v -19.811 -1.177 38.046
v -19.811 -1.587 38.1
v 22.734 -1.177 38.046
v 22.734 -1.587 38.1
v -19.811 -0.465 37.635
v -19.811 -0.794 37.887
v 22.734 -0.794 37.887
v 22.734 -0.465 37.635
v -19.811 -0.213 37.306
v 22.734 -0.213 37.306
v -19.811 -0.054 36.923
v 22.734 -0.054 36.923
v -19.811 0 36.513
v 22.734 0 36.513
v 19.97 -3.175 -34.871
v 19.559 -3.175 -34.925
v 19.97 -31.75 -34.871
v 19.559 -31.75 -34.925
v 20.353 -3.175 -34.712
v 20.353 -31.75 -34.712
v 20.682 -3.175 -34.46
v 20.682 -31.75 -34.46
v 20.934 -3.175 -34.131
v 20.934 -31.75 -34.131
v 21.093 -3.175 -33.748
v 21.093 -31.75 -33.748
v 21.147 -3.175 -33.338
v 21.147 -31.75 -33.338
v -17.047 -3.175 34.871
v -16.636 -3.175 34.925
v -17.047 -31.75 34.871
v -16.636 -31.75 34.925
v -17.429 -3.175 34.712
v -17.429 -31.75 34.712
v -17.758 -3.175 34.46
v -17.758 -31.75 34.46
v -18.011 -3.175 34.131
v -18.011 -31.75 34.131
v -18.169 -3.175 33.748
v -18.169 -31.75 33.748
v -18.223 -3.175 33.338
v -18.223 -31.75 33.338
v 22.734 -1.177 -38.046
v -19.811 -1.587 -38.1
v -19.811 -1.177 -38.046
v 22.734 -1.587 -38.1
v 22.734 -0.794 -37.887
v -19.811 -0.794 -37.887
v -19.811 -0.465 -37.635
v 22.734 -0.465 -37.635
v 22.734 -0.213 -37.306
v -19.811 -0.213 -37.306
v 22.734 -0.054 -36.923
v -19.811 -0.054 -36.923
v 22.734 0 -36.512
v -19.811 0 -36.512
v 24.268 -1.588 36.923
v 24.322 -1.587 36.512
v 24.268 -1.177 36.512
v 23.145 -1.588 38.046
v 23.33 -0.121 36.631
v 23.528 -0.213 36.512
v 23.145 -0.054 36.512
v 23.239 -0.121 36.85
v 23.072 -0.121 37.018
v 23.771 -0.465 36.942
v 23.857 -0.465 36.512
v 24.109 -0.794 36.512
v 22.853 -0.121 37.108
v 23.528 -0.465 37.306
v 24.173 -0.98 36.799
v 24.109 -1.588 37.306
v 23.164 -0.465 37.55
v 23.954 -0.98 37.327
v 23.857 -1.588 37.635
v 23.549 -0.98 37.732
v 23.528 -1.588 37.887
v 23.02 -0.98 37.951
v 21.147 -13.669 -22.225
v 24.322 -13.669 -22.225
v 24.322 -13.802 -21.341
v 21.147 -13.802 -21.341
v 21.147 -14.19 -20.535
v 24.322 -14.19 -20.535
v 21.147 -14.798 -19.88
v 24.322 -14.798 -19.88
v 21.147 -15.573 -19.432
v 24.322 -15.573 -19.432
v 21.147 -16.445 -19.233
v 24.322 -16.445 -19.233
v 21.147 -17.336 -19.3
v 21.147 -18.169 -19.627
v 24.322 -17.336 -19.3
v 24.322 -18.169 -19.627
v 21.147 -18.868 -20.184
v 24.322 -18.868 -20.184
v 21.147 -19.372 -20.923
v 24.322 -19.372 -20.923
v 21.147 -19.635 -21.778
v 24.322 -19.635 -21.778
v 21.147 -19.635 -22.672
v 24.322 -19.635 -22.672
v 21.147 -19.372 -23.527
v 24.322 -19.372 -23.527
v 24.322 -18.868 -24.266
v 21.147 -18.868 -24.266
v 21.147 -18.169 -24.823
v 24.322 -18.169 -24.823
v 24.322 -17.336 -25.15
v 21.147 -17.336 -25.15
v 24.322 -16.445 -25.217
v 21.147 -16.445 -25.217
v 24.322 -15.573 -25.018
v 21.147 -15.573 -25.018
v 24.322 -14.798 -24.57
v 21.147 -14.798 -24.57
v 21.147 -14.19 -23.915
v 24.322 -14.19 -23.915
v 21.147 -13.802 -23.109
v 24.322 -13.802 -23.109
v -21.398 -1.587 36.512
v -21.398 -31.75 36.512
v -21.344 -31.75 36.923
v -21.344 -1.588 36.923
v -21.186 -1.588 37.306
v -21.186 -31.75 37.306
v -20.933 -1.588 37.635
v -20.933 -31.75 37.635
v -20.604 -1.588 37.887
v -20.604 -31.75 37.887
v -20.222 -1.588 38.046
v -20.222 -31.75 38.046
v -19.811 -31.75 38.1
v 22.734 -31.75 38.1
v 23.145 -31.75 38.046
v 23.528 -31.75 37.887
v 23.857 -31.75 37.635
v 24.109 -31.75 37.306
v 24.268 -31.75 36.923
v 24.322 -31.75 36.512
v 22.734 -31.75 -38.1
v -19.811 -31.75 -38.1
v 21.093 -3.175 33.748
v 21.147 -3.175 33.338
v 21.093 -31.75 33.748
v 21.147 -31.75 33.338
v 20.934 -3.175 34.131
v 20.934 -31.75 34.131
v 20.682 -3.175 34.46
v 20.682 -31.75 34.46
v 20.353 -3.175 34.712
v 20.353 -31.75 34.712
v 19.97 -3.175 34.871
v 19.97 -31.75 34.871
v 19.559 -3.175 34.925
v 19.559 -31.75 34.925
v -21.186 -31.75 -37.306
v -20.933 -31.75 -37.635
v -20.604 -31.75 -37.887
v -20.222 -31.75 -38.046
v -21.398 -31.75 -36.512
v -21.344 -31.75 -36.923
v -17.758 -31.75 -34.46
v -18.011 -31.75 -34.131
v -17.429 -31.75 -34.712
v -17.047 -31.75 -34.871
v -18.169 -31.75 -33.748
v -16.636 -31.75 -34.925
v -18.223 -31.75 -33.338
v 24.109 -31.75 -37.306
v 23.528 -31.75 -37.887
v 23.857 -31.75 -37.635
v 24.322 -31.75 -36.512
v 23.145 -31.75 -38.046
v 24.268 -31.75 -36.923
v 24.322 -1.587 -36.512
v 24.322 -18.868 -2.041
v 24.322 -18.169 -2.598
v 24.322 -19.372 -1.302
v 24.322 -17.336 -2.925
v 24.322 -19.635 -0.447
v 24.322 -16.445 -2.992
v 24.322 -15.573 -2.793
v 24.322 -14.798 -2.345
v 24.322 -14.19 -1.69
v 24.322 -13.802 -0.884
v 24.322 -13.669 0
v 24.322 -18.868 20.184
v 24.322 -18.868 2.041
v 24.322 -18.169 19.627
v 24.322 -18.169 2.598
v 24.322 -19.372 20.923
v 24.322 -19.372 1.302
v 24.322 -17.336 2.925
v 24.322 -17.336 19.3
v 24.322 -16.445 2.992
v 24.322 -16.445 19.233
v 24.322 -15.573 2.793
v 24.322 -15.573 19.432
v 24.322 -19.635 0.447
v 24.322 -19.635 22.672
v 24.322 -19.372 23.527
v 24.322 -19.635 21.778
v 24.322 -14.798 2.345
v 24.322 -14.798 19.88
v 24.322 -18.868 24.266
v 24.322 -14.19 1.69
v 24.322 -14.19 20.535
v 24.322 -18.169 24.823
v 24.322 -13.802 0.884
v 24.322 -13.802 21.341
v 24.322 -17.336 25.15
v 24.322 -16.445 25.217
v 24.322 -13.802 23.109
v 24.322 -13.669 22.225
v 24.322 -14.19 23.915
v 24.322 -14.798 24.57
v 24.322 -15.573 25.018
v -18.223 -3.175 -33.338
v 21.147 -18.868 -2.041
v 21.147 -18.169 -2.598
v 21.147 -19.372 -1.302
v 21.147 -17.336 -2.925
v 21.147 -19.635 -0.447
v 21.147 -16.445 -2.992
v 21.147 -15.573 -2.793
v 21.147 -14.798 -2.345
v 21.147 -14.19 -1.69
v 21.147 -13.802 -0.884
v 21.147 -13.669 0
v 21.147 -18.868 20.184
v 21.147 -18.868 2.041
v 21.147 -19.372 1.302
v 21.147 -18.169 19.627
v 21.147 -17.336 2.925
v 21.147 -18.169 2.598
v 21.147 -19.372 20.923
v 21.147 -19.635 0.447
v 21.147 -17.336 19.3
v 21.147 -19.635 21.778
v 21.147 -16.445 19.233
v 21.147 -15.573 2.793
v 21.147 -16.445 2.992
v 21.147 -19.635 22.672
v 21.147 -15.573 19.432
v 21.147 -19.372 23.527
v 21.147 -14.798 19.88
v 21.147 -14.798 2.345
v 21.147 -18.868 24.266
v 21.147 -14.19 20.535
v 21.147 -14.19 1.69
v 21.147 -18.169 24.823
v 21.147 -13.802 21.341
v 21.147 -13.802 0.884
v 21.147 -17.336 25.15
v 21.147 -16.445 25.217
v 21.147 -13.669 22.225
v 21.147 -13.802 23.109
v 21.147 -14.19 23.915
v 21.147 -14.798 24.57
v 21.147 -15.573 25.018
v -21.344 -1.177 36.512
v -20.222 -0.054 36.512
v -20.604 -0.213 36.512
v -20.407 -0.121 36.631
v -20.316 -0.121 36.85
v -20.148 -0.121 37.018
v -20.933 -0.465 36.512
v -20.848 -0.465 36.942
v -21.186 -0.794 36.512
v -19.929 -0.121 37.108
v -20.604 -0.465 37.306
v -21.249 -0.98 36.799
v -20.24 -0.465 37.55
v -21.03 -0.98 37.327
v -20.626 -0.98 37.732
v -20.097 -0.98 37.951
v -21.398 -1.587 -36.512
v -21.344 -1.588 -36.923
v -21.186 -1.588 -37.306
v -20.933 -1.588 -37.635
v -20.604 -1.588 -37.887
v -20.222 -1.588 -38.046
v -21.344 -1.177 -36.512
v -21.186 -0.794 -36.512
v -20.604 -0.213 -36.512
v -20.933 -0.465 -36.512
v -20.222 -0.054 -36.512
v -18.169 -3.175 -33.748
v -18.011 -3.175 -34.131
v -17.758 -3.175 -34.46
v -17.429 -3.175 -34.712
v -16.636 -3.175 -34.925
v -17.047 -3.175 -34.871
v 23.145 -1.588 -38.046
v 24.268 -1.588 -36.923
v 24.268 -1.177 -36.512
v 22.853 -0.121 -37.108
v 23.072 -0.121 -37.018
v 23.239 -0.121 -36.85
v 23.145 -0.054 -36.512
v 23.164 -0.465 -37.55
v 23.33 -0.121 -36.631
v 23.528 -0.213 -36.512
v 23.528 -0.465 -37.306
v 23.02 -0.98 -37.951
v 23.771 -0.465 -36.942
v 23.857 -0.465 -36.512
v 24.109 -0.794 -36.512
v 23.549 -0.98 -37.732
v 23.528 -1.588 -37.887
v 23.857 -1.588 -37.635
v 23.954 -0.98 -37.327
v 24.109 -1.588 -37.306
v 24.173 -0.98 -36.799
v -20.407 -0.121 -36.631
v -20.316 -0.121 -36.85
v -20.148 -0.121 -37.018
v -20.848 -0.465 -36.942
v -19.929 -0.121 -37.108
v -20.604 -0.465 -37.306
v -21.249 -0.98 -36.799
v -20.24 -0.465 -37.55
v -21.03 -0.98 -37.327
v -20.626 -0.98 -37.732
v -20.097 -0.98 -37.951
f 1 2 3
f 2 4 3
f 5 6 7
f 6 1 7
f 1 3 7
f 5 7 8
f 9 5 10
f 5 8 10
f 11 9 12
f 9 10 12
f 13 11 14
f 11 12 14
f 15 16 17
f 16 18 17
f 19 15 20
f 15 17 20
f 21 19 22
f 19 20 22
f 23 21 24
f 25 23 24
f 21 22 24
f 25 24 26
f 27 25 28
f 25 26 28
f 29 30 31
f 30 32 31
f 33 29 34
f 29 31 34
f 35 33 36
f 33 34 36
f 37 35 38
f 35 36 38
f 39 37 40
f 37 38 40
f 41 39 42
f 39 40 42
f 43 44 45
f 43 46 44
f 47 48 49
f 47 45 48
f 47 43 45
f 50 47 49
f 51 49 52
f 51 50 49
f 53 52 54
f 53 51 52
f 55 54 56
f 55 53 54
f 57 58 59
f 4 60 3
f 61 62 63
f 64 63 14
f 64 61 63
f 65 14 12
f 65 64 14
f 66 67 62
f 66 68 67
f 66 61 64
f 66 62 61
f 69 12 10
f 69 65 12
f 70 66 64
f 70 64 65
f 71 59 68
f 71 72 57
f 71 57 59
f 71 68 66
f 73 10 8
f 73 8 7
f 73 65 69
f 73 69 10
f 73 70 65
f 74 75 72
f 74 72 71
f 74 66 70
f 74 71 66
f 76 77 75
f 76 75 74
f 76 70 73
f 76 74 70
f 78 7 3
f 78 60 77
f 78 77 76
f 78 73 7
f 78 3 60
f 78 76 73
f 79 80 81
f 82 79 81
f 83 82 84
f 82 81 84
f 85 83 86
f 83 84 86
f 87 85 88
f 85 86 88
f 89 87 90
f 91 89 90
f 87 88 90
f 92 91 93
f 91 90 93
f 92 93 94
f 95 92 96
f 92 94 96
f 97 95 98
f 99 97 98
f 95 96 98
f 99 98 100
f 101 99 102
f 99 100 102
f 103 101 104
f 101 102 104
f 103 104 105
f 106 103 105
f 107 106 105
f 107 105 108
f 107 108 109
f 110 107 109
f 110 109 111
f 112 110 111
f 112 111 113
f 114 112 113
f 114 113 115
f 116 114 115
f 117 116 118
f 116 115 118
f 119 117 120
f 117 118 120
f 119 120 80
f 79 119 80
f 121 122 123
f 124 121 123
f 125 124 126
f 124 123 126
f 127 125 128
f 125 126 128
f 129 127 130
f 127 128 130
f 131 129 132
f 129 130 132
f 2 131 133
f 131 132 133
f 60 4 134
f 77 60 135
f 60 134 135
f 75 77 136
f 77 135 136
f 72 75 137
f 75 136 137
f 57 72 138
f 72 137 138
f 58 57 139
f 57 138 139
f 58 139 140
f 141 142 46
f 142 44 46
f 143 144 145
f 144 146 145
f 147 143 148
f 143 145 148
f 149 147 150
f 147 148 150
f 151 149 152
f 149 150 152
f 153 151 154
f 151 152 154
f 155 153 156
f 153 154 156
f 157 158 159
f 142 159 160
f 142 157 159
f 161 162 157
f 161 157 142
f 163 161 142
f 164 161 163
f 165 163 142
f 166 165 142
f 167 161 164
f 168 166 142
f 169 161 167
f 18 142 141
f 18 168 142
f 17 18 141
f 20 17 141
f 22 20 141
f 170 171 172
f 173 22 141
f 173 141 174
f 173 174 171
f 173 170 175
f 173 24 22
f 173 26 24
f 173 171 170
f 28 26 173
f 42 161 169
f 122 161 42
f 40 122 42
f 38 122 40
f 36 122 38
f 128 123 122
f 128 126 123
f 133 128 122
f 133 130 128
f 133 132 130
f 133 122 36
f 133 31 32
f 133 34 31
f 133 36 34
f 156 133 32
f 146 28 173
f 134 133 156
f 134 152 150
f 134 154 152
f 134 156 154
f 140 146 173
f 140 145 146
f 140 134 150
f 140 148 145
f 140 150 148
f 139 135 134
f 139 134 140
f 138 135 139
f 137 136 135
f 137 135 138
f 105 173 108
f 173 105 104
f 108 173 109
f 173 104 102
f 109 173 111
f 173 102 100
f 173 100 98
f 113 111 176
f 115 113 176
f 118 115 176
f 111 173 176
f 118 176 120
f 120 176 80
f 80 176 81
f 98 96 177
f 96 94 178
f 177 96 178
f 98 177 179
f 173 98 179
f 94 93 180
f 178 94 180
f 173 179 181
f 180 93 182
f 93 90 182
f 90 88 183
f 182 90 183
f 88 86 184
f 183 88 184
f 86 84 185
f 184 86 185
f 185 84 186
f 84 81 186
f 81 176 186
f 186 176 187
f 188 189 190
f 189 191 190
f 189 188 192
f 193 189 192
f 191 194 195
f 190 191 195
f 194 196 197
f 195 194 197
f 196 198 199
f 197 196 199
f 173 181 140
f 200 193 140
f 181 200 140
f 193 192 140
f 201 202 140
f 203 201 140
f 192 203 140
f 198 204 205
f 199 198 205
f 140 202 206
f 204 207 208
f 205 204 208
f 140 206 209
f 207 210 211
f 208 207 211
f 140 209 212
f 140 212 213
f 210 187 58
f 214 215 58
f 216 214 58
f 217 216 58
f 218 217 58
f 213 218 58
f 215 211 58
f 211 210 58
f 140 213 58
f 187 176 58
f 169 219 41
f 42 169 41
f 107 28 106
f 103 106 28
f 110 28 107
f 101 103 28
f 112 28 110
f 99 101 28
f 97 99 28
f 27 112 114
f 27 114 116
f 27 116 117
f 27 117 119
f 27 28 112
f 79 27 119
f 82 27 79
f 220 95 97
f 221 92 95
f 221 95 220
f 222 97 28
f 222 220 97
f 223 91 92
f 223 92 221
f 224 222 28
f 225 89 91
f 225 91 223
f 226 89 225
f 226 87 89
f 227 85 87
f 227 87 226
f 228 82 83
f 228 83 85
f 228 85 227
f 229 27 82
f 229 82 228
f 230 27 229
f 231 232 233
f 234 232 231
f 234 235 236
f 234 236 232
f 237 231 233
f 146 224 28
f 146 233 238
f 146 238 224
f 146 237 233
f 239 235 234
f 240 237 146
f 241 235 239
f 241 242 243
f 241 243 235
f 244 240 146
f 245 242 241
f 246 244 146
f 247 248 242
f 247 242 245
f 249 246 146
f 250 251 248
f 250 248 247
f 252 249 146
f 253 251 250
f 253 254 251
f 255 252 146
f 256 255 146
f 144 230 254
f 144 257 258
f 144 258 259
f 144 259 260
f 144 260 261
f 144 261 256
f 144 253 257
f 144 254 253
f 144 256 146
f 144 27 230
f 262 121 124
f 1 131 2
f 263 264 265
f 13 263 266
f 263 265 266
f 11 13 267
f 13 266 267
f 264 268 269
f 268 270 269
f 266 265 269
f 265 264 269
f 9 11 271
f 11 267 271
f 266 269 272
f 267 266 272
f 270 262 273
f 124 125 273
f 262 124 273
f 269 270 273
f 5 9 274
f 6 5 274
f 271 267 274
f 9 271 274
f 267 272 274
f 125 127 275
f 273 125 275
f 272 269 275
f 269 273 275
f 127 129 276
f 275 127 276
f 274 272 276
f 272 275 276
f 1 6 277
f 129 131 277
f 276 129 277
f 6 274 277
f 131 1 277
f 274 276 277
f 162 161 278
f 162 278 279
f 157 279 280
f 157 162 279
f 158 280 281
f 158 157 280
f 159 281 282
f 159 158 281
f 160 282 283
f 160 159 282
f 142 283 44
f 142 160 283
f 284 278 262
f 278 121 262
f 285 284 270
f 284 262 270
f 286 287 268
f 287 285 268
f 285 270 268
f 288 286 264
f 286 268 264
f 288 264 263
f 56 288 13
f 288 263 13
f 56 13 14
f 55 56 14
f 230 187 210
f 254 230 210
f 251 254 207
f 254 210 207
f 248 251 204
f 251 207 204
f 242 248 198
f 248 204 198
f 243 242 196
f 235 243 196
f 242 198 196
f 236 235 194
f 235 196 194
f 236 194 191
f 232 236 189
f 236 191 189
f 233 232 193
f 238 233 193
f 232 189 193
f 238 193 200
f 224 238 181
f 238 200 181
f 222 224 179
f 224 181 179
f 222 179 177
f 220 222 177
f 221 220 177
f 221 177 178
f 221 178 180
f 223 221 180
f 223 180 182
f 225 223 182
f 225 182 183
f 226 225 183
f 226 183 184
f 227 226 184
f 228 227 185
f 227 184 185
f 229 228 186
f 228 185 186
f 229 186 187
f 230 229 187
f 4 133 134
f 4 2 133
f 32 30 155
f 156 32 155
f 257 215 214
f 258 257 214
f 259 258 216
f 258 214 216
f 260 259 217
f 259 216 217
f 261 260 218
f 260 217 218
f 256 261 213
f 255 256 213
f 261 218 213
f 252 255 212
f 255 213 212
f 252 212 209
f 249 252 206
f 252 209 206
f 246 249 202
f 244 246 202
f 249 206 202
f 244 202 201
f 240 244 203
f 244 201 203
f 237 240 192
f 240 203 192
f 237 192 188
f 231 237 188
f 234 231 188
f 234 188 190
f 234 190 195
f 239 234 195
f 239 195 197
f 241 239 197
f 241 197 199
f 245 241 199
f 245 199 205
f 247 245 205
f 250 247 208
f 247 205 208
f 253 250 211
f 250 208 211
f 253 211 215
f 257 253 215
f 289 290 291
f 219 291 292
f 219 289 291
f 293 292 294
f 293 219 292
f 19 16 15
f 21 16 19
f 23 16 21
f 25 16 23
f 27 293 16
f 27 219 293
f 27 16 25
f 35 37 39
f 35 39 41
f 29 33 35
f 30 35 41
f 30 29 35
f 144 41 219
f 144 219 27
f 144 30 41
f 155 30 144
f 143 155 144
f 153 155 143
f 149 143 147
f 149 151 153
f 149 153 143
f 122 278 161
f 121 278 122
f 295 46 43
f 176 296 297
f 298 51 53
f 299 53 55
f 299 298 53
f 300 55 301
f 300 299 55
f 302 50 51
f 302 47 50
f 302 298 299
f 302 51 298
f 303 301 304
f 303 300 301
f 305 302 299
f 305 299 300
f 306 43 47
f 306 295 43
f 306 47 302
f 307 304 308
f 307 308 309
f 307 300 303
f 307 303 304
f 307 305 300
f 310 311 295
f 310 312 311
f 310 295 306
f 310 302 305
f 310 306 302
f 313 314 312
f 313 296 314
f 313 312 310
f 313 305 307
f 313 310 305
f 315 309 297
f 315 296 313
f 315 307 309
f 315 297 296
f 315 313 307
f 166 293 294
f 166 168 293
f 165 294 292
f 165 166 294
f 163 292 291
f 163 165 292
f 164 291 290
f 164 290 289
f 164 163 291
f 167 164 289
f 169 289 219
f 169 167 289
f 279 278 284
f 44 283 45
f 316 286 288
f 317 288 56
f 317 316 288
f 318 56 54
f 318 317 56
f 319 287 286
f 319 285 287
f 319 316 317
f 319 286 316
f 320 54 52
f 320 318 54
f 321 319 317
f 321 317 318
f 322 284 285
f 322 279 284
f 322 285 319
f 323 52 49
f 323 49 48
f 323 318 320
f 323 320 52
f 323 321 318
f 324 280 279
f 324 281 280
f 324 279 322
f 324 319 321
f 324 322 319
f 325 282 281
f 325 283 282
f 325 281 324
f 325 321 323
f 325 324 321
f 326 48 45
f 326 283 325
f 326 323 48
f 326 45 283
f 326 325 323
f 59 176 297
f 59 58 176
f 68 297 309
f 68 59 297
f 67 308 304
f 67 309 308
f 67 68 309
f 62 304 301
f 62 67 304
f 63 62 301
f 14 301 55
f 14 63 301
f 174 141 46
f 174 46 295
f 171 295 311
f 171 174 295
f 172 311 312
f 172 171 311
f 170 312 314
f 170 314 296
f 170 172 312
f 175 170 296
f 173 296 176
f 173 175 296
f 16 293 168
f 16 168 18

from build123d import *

# Parameters (mm, degrees)
F0_W     = 45.72
F0_H     = 76.2
F0_W_2   = 39.37
F0_H_2   = 69.85
F1_DEPTH = 31.75
F2_R     = 1.5875
F4_DEPTH = 3.175
F5_R     = 1.5875
F3_R     = 3
F6_DEPTH = 3.175


with BuildPart() as f1:
    # F0 (on Front) → F1 (new body)
    with BuildSketch(Plane.XZ):
        with Locations((1.461808, 0)):
            Rectangle(F0_W, F0_H)
        with Locations((1.461808, 0)):
            Rectangle(F0_W_2, F0_H_2, mode=Mode.SUBTRACT)
    extrude(amount=F1_DEPTH)

    # F2
    f2_edges = [f1.edges().sort_by_distance(p)[0] for p in [
        (24.321808, -15.875, -38.1),
        (24.321808, -15.875, 38.1),
        (-21.398192, -15.875, 38.1),
        (-21.398192, -15.875, -38.1),
        (-21.398192, 0, 0),
        (1.461808, 0, -38.1),
        (24.321808, 0, 0),
        (1.461808, 0, 38.1),
    ]]
    fillet(f2_edges, radius=F2_R)

    # F0 (on Front) → F4 (join)
    with BuildSketch(Plane.XZ):
        with Locations((1.461808, 0)):
            Rectangle(F0_W_2, F0_H_2)
    extrude(amount=F4_DEPTH)

    # F5
    f5_edges = [f1.edges().sort_by_distance(p)[0] for p in [
        (-18.223192, -17.4625, -34.925),
        (-18.223192, -17.4625, 34.925),
        (21.146808, -17.4625, -34.925),
        (21.146808, -17.4625, 34.925),
    ]]
    fillet(f5_edges, radius=F5_R)

    # F3 (on face) → F6 (cut, through all)
    with BuildSketch(Plane.YZ.offset(24.321808)):
        with Locations((-16.66875, -22.225)):
            Circle(F3_R)
        with Locations((-16.66875, 0)):
            Circle(F3_R)
        with Locations((-16.66875, 22.225)):
            Circle(F3_R)
    extrude(amount=-F6_DEPTH, mode=Mode.SUBTRACT)


solid = f1.part
